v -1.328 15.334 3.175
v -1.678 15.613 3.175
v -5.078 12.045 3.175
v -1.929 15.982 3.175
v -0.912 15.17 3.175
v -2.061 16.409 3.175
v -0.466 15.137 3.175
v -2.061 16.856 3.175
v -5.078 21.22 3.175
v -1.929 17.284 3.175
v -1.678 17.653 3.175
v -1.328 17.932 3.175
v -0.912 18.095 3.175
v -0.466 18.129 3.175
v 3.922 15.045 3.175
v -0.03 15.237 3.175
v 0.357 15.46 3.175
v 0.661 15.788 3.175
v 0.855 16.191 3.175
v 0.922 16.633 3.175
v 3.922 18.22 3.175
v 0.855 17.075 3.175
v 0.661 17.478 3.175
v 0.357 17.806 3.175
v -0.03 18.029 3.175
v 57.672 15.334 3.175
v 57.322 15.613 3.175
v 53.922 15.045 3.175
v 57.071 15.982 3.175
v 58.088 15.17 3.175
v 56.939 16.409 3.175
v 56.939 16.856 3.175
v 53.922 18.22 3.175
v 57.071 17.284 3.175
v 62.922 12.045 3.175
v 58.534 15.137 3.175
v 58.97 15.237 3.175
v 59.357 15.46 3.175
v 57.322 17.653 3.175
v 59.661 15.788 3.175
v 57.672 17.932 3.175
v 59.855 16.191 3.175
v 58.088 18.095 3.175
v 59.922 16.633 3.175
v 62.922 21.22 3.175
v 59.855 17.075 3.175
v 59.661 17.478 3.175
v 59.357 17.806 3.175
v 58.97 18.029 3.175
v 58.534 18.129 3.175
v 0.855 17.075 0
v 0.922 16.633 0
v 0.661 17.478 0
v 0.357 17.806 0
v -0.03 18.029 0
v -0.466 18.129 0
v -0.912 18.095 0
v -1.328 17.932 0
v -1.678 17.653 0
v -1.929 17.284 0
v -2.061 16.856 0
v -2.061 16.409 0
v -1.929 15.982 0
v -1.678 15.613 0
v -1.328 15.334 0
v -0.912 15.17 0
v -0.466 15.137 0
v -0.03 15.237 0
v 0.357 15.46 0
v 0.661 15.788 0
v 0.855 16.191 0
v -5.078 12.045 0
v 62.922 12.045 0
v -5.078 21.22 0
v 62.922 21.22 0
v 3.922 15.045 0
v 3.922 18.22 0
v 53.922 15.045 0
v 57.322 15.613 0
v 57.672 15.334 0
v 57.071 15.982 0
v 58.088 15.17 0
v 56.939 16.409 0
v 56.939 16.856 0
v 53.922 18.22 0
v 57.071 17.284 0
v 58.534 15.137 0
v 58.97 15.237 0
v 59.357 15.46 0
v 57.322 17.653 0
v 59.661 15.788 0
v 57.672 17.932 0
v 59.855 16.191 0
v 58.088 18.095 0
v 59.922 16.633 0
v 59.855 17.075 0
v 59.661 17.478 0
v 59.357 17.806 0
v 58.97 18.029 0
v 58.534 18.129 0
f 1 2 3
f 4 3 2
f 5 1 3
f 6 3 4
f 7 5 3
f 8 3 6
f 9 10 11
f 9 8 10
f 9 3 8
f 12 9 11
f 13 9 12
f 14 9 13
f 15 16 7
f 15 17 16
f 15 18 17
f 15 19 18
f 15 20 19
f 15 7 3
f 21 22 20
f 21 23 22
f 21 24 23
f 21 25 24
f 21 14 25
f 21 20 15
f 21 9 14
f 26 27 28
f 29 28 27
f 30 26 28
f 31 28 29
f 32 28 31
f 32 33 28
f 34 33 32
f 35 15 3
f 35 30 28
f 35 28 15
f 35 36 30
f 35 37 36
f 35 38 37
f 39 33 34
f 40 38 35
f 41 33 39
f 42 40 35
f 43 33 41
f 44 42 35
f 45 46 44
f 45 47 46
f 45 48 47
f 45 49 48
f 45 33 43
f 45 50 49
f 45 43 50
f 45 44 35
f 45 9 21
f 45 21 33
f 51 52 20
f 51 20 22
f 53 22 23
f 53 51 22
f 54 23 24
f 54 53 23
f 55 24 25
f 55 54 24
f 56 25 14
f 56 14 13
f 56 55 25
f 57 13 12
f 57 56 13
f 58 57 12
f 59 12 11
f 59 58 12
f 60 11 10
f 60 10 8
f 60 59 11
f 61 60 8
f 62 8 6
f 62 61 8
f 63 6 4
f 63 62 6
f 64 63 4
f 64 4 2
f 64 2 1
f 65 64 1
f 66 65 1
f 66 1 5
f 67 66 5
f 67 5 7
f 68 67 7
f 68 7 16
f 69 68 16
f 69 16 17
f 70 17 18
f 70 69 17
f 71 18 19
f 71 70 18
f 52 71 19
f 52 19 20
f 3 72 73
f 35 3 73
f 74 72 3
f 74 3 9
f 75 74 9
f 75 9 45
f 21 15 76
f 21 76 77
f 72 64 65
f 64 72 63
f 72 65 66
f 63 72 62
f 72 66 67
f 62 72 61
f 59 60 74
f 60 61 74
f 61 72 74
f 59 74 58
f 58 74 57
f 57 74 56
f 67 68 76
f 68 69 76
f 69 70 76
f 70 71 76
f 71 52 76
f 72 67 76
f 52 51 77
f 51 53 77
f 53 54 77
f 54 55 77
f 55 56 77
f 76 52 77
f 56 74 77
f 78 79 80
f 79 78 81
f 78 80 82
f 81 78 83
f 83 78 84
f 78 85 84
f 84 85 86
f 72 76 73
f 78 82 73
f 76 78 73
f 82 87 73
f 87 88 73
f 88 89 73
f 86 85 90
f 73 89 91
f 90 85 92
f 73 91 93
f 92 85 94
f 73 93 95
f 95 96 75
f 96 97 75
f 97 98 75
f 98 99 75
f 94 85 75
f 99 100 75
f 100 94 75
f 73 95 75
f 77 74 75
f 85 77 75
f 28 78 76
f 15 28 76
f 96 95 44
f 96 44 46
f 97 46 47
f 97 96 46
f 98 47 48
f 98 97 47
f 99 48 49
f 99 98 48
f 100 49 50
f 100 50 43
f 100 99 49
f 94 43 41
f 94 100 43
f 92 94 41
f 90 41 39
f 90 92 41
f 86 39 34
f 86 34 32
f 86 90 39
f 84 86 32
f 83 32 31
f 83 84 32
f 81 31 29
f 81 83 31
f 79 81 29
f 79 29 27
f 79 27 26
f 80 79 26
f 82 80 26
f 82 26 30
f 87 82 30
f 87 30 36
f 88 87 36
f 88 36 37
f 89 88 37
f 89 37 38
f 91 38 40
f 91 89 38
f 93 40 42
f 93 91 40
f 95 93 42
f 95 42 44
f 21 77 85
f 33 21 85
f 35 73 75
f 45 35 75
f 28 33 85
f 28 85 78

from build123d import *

# Parameters (mm, degrees)
F0_W     = 68
F0_H     = 9.175
F0_R     = 1.5
F1_DEPTH = 3.175


# Not quite as in the source:
# - a length typed as a fraction of an inch, garbled in the dataset ("3 / 203.2 mm" for 3/8 in), is restored


with BuildPart() as f1:
    # F0 (on Top) → F1 (new body)
    with BuildSketch(Plane.XY):
        with Locations((28.9220271409, 16.632870598)):
            Rectangle(F0_W, F0_H)
        with Locations((-0.5779728591, 16.632870598)):
            Circle(F0_R, mode=Mode.SUBTRACT)
        Polygon((3.9220271409, 15.045370598), (3.9220271409, 18.220370598), (28.9220271409, 18.220370598), (53.9220271409, 18.220370598), (53.9220271409, 15.045370598), align=None, mode=Mode.SUBTRACT)
        with Locations((58.4220271409, 16.632870598)):
            Circle(F0_R, mode=Mode.SUBTRACT)
    extrude(amount=F1_DEPTH)


solid = f1.part
